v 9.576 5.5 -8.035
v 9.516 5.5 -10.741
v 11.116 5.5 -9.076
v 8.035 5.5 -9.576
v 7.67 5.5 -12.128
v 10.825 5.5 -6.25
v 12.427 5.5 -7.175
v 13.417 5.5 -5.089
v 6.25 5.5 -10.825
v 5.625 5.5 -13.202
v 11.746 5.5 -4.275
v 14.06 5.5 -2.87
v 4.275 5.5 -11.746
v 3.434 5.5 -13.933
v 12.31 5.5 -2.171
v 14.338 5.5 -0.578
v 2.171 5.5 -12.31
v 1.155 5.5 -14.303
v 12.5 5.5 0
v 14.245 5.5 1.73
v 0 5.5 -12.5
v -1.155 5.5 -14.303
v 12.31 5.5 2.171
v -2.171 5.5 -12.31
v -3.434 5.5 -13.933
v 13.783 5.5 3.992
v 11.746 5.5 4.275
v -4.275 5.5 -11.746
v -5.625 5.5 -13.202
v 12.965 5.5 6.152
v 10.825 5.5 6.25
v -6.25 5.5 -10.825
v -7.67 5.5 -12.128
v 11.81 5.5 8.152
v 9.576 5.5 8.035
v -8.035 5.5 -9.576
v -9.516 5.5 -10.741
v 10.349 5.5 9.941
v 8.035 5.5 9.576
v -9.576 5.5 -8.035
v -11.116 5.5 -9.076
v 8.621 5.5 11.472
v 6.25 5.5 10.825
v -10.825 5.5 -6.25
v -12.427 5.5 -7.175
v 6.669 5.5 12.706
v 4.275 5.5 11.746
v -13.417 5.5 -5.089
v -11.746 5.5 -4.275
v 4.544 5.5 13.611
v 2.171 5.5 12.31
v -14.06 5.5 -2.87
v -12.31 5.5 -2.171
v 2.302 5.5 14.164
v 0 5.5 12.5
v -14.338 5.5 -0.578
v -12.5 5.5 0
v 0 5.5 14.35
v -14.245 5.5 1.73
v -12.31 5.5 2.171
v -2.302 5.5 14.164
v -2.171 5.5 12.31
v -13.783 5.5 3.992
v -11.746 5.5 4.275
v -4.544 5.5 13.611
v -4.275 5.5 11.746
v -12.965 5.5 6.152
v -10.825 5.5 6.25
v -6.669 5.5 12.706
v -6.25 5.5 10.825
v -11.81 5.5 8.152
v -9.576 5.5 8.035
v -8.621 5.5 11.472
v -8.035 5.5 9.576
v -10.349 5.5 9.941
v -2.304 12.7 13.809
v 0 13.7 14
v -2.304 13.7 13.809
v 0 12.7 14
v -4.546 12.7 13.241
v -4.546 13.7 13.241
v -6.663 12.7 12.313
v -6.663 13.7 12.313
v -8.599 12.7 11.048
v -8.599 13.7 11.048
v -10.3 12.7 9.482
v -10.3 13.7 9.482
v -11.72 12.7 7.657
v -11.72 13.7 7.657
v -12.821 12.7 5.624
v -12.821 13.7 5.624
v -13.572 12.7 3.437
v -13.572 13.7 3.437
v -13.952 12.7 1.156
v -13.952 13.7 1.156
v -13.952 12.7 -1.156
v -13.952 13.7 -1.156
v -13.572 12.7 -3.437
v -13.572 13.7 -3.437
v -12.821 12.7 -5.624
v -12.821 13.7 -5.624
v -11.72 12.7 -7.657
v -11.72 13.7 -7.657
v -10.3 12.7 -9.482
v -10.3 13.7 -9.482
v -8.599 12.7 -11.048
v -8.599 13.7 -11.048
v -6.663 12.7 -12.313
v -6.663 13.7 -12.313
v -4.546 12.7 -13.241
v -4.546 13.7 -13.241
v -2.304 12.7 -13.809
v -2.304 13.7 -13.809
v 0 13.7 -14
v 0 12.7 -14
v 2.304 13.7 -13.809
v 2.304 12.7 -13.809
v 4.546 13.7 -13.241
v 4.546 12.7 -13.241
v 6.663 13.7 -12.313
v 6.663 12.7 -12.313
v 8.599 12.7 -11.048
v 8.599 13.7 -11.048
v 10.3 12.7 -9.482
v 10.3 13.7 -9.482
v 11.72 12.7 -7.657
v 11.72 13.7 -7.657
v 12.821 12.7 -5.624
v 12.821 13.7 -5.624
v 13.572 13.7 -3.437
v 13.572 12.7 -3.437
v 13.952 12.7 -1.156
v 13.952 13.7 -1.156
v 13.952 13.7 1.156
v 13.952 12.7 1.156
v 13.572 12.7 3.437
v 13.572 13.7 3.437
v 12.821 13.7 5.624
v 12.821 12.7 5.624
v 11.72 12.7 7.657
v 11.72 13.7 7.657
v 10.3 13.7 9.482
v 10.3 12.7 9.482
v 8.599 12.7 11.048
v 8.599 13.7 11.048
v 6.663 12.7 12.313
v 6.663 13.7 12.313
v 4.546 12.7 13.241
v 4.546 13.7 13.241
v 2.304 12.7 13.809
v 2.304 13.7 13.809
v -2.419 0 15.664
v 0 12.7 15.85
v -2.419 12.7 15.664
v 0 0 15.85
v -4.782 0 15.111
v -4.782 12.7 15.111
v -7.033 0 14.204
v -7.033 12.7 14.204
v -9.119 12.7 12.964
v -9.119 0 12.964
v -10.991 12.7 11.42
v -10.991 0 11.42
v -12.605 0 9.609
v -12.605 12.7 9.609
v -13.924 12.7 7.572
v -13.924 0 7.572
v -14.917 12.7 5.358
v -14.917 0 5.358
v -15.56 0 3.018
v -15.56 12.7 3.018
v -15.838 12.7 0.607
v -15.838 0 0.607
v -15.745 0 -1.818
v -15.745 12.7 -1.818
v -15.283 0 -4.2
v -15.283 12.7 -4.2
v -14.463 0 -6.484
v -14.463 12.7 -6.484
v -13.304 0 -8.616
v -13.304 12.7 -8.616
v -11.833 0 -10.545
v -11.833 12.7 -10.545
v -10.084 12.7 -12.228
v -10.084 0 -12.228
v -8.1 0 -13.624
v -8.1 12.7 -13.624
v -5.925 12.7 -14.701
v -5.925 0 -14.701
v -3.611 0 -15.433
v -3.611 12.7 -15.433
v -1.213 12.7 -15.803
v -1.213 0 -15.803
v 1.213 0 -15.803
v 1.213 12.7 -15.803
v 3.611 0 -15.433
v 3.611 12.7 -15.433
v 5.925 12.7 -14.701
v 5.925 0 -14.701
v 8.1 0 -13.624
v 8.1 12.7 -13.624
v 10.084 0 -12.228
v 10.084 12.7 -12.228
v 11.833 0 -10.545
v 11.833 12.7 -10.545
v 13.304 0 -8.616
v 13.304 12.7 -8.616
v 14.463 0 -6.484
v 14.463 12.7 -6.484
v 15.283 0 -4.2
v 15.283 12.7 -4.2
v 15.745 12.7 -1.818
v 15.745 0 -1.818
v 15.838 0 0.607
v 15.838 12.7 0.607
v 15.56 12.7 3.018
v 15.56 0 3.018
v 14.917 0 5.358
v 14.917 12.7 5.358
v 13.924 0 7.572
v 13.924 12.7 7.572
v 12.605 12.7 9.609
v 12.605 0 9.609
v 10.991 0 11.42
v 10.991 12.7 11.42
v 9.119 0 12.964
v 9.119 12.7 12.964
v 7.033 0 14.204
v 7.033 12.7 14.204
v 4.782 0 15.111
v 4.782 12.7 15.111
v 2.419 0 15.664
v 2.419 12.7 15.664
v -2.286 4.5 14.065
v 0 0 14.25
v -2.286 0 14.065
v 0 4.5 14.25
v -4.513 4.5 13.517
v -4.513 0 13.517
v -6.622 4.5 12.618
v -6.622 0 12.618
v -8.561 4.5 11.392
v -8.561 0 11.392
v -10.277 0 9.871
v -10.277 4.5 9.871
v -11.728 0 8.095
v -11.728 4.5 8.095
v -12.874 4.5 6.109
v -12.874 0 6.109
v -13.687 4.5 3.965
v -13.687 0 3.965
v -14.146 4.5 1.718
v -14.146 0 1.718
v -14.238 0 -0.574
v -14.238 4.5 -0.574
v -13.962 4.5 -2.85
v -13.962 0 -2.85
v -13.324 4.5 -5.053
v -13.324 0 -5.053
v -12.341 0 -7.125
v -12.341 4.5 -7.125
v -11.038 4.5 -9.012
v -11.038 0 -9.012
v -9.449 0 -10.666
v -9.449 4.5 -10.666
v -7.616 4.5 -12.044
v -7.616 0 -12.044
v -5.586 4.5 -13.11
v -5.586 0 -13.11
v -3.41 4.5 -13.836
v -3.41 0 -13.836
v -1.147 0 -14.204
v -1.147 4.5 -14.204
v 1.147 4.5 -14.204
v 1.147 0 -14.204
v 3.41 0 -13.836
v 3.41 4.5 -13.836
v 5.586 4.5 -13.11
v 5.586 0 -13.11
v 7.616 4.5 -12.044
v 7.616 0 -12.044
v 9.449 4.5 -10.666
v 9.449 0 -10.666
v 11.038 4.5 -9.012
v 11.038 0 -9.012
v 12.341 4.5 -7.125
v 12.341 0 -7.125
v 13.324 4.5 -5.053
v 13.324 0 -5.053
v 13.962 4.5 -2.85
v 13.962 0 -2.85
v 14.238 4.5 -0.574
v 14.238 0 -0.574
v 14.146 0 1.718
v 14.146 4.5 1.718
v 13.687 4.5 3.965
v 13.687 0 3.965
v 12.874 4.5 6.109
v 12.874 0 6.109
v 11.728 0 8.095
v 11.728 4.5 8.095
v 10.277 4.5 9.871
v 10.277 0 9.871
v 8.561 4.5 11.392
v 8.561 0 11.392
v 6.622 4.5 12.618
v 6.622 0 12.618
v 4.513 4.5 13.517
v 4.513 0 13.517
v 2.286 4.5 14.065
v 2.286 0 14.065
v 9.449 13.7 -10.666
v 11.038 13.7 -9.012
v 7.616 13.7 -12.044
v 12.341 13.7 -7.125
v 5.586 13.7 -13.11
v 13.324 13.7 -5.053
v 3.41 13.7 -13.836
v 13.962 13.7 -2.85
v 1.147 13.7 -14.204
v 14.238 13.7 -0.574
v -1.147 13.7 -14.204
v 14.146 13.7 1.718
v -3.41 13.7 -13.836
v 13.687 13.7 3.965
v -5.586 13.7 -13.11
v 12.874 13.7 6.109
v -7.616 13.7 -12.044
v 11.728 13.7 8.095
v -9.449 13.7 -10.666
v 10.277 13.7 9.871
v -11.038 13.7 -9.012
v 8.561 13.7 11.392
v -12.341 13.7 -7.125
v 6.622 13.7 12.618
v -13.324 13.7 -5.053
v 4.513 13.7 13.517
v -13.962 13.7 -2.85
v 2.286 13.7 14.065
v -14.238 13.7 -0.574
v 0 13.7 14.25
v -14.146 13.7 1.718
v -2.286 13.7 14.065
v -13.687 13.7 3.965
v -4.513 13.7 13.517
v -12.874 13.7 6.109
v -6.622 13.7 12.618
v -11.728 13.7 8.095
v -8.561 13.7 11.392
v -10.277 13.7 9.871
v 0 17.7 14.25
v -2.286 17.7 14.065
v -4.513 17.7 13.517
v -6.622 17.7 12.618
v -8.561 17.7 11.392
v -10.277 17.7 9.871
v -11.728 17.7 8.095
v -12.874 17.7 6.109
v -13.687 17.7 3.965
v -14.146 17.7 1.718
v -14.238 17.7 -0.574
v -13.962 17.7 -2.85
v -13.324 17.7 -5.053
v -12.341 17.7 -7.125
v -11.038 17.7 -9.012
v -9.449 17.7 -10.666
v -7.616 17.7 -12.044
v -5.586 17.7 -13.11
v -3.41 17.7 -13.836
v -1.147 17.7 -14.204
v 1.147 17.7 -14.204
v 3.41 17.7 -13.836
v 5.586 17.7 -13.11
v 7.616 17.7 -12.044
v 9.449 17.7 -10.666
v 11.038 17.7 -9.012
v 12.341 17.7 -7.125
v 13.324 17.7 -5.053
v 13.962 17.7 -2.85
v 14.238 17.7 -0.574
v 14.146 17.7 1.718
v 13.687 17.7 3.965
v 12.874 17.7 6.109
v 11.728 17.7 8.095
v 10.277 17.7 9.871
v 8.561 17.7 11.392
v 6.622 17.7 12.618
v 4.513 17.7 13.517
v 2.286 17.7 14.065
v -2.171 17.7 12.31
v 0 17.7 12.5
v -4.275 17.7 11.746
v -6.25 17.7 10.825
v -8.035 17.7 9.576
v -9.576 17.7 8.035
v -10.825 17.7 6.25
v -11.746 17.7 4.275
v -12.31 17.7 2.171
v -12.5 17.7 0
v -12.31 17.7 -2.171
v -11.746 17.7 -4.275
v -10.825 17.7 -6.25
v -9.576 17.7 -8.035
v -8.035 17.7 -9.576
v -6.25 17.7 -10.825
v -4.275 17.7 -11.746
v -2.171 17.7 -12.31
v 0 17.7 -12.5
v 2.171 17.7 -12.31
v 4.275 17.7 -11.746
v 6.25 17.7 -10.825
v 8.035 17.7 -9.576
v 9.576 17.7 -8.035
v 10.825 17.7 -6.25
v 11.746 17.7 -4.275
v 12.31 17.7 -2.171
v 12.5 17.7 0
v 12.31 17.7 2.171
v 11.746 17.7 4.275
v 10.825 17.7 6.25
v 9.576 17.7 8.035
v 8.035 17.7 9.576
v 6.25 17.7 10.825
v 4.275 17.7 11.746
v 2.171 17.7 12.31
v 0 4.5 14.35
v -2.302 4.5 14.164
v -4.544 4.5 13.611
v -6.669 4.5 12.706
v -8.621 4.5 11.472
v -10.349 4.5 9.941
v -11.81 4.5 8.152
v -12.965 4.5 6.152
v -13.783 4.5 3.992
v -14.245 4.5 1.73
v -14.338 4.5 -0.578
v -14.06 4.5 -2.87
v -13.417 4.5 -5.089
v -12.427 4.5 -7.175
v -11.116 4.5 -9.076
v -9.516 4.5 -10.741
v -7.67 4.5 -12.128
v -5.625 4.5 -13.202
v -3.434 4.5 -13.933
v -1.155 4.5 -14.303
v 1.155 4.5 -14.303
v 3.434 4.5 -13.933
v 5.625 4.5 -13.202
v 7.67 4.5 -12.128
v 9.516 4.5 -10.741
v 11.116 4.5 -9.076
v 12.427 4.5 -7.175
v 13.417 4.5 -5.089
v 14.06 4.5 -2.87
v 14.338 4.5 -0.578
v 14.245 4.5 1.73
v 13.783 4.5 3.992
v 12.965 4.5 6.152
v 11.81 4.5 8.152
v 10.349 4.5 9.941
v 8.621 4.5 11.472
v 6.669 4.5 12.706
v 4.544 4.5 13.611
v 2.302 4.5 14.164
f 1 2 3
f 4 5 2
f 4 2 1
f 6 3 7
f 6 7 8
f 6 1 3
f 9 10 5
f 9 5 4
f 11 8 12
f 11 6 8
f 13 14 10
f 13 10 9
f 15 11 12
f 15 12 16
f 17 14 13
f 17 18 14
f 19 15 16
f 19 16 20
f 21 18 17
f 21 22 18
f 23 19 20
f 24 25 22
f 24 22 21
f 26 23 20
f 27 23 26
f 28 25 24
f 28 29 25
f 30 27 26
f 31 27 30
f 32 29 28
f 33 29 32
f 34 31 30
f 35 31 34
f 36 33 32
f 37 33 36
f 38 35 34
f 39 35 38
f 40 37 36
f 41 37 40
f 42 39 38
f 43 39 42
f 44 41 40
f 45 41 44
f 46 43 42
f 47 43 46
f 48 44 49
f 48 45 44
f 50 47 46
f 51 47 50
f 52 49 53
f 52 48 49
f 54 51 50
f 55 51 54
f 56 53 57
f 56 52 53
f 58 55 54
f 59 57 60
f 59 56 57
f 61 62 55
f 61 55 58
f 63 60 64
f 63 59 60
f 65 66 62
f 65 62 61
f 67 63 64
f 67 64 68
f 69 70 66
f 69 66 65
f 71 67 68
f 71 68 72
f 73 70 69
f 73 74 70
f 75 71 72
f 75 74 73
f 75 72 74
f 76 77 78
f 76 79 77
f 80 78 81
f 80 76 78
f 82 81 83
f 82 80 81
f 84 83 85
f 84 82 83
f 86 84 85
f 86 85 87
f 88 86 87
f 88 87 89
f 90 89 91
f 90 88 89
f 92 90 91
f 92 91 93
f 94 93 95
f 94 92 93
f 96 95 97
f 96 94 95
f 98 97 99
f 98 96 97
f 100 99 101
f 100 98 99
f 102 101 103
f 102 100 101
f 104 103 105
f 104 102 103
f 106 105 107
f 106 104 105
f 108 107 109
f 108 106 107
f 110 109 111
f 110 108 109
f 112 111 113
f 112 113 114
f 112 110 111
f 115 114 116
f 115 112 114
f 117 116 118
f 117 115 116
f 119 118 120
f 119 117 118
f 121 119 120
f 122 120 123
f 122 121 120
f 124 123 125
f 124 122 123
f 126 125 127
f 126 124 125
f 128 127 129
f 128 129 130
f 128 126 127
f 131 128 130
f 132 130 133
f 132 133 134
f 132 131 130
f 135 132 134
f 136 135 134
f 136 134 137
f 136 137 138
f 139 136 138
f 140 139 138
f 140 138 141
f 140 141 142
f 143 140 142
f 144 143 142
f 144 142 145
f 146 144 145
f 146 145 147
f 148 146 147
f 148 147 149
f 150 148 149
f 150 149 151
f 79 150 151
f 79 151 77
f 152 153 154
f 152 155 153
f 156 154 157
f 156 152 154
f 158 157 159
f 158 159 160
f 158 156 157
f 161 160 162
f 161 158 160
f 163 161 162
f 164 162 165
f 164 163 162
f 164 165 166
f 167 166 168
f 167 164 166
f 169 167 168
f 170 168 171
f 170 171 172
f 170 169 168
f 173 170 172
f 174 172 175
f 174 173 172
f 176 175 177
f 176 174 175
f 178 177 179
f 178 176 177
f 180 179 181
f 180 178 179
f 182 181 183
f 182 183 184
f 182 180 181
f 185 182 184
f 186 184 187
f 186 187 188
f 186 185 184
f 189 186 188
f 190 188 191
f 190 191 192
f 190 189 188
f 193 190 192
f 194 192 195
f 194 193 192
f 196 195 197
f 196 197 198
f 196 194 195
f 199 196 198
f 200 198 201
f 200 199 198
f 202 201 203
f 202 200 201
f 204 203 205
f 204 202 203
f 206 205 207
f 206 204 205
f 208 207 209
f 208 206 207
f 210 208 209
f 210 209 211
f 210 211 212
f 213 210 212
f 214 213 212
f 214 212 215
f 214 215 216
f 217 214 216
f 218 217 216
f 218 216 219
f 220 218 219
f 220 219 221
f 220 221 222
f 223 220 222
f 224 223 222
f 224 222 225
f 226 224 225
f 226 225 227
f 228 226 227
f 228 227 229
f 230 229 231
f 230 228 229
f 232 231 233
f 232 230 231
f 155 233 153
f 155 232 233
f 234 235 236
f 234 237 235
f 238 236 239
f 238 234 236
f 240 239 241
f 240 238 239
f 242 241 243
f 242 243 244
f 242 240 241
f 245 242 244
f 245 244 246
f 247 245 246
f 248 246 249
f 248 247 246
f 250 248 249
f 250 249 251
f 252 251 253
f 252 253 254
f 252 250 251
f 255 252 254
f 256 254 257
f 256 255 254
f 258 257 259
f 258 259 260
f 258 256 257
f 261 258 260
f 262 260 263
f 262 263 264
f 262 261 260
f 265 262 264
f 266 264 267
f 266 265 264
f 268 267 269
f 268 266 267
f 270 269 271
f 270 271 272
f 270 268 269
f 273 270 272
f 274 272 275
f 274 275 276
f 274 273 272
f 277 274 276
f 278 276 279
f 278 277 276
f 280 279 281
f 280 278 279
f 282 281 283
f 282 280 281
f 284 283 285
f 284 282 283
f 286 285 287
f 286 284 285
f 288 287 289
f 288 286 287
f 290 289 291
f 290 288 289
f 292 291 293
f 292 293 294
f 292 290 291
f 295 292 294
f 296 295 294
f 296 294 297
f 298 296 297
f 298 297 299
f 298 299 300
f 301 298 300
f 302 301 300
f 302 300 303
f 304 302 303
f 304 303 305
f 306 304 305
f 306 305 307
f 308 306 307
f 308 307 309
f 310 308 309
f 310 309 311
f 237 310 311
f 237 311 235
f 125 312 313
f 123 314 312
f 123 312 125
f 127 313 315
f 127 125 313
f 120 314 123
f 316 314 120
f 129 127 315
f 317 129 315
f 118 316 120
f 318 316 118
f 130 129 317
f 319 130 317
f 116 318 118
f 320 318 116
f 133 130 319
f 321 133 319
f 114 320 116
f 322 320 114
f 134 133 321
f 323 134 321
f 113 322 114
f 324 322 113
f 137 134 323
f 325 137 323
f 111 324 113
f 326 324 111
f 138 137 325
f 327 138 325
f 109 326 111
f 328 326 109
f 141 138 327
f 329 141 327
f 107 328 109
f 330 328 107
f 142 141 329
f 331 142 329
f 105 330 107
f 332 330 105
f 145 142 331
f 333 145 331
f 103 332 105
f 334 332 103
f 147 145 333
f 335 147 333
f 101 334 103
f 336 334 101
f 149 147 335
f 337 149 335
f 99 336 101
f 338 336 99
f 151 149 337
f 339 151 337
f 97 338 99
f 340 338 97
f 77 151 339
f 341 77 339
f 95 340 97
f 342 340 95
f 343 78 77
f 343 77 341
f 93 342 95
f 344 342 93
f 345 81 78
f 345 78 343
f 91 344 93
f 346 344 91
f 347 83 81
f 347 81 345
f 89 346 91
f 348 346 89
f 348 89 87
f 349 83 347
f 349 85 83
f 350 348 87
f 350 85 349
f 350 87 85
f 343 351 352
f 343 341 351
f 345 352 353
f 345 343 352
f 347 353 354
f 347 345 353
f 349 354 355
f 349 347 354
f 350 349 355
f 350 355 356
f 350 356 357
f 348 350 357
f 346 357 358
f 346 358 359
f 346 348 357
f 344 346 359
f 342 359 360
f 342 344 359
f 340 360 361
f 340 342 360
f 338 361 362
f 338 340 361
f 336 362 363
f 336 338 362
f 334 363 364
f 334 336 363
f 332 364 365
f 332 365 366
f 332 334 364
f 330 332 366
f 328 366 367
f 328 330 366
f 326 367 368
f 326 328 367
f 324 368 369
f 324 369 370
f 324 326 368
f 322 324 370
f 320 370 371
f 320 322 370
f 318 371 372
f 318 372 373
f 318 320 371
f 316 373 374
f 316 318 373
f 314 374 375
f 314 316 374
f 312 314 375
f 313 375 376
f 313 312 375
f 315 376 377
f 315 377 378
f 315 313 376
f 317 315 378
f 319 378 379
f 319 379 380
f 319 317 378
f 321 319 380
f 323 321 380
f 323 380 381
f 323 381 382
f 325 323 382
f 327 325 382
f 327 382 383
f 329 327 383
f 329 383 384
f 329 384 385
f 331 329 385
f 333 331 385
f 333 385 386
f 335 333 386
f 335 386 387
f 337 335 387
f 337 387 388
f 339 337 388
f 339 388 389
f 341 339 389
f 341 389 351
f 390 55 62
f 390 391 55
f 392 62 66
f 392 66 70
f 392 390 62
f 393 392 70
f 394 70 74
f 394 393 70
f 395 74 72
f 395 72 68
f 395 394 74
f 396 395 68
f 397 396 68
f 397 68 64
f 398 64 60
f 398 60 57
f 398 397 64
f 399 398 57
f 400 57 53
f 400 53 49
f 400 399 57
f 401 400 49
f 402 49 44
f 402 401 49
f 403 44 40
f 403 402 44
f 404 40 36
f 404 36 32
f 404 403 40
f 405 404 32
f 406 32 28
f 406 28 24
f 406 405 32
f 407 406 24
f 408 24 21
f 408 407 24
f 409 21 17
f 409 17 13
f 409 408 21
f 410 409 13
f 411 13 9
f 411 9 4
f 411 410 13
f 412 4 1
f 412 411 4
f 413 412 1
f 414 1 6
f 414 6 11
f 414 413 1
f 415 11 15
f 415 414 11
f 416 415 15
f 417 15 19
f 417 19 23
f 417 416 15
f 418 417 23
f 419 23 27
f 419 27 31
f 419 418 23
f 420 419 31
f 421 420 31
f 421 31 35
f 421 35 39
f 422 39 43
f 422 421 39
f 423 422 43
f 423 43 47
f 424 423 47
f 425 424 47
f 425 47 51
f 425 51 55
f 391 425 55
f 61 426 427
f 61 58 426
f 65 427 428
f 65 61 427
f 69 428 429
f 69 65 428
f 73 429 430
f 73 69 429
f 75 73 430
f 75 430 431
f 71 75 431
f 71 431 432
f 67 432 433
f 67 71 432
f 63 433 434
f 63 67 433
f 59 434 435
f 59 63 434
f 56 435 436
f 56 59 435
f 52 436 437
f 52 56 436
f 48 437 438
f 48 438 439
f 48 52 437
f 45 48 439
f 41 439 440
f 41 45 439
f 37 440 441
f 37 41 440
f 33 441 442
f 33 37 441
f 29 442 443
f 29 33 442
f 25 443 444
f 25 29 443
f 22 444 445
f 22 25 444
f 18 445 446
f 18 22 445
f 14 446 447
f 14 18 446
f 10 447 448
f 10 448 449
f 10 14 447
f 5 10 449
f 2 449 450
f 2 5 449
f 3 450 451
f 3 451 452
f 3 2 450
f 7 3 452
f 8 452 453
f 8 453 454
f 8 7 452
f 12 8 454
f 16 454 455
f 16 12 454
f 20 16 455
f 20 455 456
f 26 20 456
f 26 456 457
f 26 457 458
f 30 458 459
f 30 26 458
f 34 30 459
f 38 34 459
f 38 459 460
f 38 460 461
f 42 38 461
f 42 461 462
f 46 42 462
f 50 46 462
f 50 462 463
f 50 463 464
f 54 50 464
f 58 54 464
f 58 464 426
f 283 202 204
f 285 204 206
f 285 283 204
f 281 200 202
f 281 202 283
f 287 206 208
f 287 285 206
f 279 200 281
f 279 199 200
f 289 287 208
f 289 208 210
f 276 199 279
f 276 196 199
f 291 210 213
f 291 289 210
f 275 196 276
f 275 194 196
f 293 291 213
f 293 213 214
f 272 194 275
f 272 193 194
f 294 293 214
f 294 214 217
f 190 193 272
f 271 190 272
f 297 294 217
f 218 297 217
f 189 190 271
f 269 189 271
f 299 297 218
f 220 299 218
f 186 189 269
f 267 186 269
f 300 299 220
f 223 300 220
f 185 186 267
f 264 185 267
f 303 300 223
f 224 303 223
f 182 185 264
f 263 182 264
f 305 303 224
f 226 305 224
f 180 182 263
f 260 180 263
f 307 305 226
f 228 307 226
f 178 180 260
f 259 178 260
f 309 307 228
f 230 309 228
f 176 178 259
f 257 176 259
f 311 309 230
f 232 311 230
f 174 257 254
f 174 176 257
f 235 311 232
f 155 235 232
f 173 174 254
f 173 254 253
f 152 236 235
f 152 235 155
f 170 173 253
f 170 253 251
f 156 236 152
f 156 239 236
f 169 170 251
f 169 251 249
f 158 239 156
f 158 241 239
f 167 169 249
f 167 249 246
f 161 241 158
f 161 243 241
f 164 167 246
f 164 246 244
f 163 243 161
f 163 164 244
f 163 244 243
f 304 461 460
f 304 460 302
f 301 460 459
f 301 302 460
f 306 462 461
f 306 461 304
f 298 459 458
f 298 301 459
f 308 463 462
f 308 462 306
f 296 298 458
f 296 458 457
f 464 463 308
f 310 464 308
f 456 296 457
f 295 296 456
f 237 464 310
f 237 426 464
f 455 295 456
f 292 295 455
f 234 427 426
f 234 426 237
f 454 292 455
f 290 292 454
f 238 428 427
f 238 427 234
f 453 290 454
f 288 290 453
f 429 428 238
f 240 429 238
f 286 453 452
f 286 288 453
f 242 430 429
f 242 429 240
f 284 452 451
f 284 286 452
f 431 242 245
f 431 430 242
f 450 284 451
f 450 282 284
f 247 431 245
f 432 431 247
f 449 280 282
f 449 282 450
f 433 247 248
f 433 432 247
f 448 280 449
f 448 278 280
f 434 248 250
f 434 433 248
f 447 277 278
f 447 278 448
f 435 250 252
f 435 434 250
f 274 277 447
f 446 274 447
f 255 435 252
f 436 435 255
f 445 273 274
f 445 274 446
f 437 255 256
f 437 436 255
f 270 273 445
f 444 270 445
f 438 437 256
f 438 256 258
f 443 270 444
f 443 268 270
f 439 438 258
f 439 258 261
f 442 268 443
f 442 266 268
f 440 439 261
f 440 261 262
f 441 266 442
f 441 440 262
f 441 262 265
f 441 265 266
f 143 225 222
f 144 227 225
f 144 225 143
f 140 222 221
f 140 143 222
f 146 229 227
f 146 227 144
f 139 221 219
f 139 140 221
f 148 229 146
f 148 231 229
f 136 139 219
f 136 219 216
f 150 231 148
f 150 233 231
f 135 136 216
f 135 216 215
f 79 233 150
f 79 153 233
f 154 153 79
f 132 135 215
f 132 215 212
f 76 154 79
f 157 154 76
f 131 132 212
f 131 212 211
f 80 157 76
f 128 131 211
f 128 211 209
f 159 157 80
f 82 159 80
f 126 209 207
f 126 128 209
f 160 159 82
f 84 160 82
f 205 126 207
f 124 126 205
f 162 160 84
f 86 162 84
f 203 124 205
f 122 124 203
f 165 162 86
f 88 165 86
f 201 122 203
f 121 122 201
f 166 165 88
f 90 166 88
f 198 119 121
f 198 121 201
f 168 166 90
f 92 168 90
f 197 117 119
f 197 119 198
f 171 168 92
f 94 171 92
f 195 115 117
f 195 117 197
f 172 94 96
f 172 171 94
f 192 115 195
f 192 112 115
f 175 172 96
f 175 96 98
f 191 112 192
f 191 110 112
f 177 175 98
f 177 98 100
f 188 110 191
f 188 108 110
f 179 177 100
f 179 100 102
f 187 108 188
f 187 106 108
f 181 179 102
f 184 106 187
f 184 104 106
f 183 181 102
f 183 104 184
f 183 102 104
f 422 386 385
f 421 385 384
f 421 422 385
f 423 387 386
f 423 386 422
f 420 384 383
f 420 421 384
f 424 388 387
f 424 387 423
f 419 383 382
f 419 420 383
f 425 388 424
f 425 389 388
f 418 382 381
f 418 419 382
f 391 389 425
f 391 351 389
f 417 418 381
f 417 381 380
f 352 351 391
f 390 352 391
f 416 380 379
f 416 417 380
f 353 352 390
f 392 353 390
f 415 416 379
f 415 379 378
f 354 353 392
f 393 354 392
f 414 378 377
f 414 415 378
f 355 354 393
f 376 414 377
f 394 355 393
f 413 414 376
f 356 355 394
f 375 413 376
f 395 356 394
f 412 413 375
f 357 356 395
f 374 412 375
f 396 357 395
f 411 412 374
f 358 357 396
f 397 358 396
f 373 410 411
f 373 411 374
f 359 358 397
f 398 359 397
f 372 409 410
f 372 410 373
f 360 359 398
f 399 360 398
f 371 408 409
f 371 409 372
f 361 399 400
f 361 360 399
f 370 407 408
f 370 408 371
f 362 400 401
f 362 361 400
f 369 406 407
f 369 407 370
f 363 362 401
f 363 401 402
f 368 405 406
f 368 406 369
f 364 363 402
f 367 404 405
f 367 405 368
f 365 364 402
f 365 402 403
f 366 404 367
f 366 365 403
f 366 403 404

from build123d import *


with BuildPart() as part:
    # 草图1 → 旋转1 (revolve)
    with BuildSketch(Plane.XY, mode=Mode.PRIVATE) as revolve_1_sk:
        Polygon((14.25, 0), (14.25, 4.5), (14.35, 4.5), (14.35, 5.5), (12.5, 5.5), (12.5, 17.7), (14.25, 17.7), (14.25, 13.7), (14, 13.7), (14, 12.7), (15.85, 12.7), (15.85, 0), align=None)
    revolve(revolve_1_sk.sketch.rotate(Axis((0, 161.376166943, 0), (0, -1, 0)), 90), axis=Axis((0, 161.376166943, 0), (0, -1, 0)))  # turned: the seam where the file's is


solid = part.part
